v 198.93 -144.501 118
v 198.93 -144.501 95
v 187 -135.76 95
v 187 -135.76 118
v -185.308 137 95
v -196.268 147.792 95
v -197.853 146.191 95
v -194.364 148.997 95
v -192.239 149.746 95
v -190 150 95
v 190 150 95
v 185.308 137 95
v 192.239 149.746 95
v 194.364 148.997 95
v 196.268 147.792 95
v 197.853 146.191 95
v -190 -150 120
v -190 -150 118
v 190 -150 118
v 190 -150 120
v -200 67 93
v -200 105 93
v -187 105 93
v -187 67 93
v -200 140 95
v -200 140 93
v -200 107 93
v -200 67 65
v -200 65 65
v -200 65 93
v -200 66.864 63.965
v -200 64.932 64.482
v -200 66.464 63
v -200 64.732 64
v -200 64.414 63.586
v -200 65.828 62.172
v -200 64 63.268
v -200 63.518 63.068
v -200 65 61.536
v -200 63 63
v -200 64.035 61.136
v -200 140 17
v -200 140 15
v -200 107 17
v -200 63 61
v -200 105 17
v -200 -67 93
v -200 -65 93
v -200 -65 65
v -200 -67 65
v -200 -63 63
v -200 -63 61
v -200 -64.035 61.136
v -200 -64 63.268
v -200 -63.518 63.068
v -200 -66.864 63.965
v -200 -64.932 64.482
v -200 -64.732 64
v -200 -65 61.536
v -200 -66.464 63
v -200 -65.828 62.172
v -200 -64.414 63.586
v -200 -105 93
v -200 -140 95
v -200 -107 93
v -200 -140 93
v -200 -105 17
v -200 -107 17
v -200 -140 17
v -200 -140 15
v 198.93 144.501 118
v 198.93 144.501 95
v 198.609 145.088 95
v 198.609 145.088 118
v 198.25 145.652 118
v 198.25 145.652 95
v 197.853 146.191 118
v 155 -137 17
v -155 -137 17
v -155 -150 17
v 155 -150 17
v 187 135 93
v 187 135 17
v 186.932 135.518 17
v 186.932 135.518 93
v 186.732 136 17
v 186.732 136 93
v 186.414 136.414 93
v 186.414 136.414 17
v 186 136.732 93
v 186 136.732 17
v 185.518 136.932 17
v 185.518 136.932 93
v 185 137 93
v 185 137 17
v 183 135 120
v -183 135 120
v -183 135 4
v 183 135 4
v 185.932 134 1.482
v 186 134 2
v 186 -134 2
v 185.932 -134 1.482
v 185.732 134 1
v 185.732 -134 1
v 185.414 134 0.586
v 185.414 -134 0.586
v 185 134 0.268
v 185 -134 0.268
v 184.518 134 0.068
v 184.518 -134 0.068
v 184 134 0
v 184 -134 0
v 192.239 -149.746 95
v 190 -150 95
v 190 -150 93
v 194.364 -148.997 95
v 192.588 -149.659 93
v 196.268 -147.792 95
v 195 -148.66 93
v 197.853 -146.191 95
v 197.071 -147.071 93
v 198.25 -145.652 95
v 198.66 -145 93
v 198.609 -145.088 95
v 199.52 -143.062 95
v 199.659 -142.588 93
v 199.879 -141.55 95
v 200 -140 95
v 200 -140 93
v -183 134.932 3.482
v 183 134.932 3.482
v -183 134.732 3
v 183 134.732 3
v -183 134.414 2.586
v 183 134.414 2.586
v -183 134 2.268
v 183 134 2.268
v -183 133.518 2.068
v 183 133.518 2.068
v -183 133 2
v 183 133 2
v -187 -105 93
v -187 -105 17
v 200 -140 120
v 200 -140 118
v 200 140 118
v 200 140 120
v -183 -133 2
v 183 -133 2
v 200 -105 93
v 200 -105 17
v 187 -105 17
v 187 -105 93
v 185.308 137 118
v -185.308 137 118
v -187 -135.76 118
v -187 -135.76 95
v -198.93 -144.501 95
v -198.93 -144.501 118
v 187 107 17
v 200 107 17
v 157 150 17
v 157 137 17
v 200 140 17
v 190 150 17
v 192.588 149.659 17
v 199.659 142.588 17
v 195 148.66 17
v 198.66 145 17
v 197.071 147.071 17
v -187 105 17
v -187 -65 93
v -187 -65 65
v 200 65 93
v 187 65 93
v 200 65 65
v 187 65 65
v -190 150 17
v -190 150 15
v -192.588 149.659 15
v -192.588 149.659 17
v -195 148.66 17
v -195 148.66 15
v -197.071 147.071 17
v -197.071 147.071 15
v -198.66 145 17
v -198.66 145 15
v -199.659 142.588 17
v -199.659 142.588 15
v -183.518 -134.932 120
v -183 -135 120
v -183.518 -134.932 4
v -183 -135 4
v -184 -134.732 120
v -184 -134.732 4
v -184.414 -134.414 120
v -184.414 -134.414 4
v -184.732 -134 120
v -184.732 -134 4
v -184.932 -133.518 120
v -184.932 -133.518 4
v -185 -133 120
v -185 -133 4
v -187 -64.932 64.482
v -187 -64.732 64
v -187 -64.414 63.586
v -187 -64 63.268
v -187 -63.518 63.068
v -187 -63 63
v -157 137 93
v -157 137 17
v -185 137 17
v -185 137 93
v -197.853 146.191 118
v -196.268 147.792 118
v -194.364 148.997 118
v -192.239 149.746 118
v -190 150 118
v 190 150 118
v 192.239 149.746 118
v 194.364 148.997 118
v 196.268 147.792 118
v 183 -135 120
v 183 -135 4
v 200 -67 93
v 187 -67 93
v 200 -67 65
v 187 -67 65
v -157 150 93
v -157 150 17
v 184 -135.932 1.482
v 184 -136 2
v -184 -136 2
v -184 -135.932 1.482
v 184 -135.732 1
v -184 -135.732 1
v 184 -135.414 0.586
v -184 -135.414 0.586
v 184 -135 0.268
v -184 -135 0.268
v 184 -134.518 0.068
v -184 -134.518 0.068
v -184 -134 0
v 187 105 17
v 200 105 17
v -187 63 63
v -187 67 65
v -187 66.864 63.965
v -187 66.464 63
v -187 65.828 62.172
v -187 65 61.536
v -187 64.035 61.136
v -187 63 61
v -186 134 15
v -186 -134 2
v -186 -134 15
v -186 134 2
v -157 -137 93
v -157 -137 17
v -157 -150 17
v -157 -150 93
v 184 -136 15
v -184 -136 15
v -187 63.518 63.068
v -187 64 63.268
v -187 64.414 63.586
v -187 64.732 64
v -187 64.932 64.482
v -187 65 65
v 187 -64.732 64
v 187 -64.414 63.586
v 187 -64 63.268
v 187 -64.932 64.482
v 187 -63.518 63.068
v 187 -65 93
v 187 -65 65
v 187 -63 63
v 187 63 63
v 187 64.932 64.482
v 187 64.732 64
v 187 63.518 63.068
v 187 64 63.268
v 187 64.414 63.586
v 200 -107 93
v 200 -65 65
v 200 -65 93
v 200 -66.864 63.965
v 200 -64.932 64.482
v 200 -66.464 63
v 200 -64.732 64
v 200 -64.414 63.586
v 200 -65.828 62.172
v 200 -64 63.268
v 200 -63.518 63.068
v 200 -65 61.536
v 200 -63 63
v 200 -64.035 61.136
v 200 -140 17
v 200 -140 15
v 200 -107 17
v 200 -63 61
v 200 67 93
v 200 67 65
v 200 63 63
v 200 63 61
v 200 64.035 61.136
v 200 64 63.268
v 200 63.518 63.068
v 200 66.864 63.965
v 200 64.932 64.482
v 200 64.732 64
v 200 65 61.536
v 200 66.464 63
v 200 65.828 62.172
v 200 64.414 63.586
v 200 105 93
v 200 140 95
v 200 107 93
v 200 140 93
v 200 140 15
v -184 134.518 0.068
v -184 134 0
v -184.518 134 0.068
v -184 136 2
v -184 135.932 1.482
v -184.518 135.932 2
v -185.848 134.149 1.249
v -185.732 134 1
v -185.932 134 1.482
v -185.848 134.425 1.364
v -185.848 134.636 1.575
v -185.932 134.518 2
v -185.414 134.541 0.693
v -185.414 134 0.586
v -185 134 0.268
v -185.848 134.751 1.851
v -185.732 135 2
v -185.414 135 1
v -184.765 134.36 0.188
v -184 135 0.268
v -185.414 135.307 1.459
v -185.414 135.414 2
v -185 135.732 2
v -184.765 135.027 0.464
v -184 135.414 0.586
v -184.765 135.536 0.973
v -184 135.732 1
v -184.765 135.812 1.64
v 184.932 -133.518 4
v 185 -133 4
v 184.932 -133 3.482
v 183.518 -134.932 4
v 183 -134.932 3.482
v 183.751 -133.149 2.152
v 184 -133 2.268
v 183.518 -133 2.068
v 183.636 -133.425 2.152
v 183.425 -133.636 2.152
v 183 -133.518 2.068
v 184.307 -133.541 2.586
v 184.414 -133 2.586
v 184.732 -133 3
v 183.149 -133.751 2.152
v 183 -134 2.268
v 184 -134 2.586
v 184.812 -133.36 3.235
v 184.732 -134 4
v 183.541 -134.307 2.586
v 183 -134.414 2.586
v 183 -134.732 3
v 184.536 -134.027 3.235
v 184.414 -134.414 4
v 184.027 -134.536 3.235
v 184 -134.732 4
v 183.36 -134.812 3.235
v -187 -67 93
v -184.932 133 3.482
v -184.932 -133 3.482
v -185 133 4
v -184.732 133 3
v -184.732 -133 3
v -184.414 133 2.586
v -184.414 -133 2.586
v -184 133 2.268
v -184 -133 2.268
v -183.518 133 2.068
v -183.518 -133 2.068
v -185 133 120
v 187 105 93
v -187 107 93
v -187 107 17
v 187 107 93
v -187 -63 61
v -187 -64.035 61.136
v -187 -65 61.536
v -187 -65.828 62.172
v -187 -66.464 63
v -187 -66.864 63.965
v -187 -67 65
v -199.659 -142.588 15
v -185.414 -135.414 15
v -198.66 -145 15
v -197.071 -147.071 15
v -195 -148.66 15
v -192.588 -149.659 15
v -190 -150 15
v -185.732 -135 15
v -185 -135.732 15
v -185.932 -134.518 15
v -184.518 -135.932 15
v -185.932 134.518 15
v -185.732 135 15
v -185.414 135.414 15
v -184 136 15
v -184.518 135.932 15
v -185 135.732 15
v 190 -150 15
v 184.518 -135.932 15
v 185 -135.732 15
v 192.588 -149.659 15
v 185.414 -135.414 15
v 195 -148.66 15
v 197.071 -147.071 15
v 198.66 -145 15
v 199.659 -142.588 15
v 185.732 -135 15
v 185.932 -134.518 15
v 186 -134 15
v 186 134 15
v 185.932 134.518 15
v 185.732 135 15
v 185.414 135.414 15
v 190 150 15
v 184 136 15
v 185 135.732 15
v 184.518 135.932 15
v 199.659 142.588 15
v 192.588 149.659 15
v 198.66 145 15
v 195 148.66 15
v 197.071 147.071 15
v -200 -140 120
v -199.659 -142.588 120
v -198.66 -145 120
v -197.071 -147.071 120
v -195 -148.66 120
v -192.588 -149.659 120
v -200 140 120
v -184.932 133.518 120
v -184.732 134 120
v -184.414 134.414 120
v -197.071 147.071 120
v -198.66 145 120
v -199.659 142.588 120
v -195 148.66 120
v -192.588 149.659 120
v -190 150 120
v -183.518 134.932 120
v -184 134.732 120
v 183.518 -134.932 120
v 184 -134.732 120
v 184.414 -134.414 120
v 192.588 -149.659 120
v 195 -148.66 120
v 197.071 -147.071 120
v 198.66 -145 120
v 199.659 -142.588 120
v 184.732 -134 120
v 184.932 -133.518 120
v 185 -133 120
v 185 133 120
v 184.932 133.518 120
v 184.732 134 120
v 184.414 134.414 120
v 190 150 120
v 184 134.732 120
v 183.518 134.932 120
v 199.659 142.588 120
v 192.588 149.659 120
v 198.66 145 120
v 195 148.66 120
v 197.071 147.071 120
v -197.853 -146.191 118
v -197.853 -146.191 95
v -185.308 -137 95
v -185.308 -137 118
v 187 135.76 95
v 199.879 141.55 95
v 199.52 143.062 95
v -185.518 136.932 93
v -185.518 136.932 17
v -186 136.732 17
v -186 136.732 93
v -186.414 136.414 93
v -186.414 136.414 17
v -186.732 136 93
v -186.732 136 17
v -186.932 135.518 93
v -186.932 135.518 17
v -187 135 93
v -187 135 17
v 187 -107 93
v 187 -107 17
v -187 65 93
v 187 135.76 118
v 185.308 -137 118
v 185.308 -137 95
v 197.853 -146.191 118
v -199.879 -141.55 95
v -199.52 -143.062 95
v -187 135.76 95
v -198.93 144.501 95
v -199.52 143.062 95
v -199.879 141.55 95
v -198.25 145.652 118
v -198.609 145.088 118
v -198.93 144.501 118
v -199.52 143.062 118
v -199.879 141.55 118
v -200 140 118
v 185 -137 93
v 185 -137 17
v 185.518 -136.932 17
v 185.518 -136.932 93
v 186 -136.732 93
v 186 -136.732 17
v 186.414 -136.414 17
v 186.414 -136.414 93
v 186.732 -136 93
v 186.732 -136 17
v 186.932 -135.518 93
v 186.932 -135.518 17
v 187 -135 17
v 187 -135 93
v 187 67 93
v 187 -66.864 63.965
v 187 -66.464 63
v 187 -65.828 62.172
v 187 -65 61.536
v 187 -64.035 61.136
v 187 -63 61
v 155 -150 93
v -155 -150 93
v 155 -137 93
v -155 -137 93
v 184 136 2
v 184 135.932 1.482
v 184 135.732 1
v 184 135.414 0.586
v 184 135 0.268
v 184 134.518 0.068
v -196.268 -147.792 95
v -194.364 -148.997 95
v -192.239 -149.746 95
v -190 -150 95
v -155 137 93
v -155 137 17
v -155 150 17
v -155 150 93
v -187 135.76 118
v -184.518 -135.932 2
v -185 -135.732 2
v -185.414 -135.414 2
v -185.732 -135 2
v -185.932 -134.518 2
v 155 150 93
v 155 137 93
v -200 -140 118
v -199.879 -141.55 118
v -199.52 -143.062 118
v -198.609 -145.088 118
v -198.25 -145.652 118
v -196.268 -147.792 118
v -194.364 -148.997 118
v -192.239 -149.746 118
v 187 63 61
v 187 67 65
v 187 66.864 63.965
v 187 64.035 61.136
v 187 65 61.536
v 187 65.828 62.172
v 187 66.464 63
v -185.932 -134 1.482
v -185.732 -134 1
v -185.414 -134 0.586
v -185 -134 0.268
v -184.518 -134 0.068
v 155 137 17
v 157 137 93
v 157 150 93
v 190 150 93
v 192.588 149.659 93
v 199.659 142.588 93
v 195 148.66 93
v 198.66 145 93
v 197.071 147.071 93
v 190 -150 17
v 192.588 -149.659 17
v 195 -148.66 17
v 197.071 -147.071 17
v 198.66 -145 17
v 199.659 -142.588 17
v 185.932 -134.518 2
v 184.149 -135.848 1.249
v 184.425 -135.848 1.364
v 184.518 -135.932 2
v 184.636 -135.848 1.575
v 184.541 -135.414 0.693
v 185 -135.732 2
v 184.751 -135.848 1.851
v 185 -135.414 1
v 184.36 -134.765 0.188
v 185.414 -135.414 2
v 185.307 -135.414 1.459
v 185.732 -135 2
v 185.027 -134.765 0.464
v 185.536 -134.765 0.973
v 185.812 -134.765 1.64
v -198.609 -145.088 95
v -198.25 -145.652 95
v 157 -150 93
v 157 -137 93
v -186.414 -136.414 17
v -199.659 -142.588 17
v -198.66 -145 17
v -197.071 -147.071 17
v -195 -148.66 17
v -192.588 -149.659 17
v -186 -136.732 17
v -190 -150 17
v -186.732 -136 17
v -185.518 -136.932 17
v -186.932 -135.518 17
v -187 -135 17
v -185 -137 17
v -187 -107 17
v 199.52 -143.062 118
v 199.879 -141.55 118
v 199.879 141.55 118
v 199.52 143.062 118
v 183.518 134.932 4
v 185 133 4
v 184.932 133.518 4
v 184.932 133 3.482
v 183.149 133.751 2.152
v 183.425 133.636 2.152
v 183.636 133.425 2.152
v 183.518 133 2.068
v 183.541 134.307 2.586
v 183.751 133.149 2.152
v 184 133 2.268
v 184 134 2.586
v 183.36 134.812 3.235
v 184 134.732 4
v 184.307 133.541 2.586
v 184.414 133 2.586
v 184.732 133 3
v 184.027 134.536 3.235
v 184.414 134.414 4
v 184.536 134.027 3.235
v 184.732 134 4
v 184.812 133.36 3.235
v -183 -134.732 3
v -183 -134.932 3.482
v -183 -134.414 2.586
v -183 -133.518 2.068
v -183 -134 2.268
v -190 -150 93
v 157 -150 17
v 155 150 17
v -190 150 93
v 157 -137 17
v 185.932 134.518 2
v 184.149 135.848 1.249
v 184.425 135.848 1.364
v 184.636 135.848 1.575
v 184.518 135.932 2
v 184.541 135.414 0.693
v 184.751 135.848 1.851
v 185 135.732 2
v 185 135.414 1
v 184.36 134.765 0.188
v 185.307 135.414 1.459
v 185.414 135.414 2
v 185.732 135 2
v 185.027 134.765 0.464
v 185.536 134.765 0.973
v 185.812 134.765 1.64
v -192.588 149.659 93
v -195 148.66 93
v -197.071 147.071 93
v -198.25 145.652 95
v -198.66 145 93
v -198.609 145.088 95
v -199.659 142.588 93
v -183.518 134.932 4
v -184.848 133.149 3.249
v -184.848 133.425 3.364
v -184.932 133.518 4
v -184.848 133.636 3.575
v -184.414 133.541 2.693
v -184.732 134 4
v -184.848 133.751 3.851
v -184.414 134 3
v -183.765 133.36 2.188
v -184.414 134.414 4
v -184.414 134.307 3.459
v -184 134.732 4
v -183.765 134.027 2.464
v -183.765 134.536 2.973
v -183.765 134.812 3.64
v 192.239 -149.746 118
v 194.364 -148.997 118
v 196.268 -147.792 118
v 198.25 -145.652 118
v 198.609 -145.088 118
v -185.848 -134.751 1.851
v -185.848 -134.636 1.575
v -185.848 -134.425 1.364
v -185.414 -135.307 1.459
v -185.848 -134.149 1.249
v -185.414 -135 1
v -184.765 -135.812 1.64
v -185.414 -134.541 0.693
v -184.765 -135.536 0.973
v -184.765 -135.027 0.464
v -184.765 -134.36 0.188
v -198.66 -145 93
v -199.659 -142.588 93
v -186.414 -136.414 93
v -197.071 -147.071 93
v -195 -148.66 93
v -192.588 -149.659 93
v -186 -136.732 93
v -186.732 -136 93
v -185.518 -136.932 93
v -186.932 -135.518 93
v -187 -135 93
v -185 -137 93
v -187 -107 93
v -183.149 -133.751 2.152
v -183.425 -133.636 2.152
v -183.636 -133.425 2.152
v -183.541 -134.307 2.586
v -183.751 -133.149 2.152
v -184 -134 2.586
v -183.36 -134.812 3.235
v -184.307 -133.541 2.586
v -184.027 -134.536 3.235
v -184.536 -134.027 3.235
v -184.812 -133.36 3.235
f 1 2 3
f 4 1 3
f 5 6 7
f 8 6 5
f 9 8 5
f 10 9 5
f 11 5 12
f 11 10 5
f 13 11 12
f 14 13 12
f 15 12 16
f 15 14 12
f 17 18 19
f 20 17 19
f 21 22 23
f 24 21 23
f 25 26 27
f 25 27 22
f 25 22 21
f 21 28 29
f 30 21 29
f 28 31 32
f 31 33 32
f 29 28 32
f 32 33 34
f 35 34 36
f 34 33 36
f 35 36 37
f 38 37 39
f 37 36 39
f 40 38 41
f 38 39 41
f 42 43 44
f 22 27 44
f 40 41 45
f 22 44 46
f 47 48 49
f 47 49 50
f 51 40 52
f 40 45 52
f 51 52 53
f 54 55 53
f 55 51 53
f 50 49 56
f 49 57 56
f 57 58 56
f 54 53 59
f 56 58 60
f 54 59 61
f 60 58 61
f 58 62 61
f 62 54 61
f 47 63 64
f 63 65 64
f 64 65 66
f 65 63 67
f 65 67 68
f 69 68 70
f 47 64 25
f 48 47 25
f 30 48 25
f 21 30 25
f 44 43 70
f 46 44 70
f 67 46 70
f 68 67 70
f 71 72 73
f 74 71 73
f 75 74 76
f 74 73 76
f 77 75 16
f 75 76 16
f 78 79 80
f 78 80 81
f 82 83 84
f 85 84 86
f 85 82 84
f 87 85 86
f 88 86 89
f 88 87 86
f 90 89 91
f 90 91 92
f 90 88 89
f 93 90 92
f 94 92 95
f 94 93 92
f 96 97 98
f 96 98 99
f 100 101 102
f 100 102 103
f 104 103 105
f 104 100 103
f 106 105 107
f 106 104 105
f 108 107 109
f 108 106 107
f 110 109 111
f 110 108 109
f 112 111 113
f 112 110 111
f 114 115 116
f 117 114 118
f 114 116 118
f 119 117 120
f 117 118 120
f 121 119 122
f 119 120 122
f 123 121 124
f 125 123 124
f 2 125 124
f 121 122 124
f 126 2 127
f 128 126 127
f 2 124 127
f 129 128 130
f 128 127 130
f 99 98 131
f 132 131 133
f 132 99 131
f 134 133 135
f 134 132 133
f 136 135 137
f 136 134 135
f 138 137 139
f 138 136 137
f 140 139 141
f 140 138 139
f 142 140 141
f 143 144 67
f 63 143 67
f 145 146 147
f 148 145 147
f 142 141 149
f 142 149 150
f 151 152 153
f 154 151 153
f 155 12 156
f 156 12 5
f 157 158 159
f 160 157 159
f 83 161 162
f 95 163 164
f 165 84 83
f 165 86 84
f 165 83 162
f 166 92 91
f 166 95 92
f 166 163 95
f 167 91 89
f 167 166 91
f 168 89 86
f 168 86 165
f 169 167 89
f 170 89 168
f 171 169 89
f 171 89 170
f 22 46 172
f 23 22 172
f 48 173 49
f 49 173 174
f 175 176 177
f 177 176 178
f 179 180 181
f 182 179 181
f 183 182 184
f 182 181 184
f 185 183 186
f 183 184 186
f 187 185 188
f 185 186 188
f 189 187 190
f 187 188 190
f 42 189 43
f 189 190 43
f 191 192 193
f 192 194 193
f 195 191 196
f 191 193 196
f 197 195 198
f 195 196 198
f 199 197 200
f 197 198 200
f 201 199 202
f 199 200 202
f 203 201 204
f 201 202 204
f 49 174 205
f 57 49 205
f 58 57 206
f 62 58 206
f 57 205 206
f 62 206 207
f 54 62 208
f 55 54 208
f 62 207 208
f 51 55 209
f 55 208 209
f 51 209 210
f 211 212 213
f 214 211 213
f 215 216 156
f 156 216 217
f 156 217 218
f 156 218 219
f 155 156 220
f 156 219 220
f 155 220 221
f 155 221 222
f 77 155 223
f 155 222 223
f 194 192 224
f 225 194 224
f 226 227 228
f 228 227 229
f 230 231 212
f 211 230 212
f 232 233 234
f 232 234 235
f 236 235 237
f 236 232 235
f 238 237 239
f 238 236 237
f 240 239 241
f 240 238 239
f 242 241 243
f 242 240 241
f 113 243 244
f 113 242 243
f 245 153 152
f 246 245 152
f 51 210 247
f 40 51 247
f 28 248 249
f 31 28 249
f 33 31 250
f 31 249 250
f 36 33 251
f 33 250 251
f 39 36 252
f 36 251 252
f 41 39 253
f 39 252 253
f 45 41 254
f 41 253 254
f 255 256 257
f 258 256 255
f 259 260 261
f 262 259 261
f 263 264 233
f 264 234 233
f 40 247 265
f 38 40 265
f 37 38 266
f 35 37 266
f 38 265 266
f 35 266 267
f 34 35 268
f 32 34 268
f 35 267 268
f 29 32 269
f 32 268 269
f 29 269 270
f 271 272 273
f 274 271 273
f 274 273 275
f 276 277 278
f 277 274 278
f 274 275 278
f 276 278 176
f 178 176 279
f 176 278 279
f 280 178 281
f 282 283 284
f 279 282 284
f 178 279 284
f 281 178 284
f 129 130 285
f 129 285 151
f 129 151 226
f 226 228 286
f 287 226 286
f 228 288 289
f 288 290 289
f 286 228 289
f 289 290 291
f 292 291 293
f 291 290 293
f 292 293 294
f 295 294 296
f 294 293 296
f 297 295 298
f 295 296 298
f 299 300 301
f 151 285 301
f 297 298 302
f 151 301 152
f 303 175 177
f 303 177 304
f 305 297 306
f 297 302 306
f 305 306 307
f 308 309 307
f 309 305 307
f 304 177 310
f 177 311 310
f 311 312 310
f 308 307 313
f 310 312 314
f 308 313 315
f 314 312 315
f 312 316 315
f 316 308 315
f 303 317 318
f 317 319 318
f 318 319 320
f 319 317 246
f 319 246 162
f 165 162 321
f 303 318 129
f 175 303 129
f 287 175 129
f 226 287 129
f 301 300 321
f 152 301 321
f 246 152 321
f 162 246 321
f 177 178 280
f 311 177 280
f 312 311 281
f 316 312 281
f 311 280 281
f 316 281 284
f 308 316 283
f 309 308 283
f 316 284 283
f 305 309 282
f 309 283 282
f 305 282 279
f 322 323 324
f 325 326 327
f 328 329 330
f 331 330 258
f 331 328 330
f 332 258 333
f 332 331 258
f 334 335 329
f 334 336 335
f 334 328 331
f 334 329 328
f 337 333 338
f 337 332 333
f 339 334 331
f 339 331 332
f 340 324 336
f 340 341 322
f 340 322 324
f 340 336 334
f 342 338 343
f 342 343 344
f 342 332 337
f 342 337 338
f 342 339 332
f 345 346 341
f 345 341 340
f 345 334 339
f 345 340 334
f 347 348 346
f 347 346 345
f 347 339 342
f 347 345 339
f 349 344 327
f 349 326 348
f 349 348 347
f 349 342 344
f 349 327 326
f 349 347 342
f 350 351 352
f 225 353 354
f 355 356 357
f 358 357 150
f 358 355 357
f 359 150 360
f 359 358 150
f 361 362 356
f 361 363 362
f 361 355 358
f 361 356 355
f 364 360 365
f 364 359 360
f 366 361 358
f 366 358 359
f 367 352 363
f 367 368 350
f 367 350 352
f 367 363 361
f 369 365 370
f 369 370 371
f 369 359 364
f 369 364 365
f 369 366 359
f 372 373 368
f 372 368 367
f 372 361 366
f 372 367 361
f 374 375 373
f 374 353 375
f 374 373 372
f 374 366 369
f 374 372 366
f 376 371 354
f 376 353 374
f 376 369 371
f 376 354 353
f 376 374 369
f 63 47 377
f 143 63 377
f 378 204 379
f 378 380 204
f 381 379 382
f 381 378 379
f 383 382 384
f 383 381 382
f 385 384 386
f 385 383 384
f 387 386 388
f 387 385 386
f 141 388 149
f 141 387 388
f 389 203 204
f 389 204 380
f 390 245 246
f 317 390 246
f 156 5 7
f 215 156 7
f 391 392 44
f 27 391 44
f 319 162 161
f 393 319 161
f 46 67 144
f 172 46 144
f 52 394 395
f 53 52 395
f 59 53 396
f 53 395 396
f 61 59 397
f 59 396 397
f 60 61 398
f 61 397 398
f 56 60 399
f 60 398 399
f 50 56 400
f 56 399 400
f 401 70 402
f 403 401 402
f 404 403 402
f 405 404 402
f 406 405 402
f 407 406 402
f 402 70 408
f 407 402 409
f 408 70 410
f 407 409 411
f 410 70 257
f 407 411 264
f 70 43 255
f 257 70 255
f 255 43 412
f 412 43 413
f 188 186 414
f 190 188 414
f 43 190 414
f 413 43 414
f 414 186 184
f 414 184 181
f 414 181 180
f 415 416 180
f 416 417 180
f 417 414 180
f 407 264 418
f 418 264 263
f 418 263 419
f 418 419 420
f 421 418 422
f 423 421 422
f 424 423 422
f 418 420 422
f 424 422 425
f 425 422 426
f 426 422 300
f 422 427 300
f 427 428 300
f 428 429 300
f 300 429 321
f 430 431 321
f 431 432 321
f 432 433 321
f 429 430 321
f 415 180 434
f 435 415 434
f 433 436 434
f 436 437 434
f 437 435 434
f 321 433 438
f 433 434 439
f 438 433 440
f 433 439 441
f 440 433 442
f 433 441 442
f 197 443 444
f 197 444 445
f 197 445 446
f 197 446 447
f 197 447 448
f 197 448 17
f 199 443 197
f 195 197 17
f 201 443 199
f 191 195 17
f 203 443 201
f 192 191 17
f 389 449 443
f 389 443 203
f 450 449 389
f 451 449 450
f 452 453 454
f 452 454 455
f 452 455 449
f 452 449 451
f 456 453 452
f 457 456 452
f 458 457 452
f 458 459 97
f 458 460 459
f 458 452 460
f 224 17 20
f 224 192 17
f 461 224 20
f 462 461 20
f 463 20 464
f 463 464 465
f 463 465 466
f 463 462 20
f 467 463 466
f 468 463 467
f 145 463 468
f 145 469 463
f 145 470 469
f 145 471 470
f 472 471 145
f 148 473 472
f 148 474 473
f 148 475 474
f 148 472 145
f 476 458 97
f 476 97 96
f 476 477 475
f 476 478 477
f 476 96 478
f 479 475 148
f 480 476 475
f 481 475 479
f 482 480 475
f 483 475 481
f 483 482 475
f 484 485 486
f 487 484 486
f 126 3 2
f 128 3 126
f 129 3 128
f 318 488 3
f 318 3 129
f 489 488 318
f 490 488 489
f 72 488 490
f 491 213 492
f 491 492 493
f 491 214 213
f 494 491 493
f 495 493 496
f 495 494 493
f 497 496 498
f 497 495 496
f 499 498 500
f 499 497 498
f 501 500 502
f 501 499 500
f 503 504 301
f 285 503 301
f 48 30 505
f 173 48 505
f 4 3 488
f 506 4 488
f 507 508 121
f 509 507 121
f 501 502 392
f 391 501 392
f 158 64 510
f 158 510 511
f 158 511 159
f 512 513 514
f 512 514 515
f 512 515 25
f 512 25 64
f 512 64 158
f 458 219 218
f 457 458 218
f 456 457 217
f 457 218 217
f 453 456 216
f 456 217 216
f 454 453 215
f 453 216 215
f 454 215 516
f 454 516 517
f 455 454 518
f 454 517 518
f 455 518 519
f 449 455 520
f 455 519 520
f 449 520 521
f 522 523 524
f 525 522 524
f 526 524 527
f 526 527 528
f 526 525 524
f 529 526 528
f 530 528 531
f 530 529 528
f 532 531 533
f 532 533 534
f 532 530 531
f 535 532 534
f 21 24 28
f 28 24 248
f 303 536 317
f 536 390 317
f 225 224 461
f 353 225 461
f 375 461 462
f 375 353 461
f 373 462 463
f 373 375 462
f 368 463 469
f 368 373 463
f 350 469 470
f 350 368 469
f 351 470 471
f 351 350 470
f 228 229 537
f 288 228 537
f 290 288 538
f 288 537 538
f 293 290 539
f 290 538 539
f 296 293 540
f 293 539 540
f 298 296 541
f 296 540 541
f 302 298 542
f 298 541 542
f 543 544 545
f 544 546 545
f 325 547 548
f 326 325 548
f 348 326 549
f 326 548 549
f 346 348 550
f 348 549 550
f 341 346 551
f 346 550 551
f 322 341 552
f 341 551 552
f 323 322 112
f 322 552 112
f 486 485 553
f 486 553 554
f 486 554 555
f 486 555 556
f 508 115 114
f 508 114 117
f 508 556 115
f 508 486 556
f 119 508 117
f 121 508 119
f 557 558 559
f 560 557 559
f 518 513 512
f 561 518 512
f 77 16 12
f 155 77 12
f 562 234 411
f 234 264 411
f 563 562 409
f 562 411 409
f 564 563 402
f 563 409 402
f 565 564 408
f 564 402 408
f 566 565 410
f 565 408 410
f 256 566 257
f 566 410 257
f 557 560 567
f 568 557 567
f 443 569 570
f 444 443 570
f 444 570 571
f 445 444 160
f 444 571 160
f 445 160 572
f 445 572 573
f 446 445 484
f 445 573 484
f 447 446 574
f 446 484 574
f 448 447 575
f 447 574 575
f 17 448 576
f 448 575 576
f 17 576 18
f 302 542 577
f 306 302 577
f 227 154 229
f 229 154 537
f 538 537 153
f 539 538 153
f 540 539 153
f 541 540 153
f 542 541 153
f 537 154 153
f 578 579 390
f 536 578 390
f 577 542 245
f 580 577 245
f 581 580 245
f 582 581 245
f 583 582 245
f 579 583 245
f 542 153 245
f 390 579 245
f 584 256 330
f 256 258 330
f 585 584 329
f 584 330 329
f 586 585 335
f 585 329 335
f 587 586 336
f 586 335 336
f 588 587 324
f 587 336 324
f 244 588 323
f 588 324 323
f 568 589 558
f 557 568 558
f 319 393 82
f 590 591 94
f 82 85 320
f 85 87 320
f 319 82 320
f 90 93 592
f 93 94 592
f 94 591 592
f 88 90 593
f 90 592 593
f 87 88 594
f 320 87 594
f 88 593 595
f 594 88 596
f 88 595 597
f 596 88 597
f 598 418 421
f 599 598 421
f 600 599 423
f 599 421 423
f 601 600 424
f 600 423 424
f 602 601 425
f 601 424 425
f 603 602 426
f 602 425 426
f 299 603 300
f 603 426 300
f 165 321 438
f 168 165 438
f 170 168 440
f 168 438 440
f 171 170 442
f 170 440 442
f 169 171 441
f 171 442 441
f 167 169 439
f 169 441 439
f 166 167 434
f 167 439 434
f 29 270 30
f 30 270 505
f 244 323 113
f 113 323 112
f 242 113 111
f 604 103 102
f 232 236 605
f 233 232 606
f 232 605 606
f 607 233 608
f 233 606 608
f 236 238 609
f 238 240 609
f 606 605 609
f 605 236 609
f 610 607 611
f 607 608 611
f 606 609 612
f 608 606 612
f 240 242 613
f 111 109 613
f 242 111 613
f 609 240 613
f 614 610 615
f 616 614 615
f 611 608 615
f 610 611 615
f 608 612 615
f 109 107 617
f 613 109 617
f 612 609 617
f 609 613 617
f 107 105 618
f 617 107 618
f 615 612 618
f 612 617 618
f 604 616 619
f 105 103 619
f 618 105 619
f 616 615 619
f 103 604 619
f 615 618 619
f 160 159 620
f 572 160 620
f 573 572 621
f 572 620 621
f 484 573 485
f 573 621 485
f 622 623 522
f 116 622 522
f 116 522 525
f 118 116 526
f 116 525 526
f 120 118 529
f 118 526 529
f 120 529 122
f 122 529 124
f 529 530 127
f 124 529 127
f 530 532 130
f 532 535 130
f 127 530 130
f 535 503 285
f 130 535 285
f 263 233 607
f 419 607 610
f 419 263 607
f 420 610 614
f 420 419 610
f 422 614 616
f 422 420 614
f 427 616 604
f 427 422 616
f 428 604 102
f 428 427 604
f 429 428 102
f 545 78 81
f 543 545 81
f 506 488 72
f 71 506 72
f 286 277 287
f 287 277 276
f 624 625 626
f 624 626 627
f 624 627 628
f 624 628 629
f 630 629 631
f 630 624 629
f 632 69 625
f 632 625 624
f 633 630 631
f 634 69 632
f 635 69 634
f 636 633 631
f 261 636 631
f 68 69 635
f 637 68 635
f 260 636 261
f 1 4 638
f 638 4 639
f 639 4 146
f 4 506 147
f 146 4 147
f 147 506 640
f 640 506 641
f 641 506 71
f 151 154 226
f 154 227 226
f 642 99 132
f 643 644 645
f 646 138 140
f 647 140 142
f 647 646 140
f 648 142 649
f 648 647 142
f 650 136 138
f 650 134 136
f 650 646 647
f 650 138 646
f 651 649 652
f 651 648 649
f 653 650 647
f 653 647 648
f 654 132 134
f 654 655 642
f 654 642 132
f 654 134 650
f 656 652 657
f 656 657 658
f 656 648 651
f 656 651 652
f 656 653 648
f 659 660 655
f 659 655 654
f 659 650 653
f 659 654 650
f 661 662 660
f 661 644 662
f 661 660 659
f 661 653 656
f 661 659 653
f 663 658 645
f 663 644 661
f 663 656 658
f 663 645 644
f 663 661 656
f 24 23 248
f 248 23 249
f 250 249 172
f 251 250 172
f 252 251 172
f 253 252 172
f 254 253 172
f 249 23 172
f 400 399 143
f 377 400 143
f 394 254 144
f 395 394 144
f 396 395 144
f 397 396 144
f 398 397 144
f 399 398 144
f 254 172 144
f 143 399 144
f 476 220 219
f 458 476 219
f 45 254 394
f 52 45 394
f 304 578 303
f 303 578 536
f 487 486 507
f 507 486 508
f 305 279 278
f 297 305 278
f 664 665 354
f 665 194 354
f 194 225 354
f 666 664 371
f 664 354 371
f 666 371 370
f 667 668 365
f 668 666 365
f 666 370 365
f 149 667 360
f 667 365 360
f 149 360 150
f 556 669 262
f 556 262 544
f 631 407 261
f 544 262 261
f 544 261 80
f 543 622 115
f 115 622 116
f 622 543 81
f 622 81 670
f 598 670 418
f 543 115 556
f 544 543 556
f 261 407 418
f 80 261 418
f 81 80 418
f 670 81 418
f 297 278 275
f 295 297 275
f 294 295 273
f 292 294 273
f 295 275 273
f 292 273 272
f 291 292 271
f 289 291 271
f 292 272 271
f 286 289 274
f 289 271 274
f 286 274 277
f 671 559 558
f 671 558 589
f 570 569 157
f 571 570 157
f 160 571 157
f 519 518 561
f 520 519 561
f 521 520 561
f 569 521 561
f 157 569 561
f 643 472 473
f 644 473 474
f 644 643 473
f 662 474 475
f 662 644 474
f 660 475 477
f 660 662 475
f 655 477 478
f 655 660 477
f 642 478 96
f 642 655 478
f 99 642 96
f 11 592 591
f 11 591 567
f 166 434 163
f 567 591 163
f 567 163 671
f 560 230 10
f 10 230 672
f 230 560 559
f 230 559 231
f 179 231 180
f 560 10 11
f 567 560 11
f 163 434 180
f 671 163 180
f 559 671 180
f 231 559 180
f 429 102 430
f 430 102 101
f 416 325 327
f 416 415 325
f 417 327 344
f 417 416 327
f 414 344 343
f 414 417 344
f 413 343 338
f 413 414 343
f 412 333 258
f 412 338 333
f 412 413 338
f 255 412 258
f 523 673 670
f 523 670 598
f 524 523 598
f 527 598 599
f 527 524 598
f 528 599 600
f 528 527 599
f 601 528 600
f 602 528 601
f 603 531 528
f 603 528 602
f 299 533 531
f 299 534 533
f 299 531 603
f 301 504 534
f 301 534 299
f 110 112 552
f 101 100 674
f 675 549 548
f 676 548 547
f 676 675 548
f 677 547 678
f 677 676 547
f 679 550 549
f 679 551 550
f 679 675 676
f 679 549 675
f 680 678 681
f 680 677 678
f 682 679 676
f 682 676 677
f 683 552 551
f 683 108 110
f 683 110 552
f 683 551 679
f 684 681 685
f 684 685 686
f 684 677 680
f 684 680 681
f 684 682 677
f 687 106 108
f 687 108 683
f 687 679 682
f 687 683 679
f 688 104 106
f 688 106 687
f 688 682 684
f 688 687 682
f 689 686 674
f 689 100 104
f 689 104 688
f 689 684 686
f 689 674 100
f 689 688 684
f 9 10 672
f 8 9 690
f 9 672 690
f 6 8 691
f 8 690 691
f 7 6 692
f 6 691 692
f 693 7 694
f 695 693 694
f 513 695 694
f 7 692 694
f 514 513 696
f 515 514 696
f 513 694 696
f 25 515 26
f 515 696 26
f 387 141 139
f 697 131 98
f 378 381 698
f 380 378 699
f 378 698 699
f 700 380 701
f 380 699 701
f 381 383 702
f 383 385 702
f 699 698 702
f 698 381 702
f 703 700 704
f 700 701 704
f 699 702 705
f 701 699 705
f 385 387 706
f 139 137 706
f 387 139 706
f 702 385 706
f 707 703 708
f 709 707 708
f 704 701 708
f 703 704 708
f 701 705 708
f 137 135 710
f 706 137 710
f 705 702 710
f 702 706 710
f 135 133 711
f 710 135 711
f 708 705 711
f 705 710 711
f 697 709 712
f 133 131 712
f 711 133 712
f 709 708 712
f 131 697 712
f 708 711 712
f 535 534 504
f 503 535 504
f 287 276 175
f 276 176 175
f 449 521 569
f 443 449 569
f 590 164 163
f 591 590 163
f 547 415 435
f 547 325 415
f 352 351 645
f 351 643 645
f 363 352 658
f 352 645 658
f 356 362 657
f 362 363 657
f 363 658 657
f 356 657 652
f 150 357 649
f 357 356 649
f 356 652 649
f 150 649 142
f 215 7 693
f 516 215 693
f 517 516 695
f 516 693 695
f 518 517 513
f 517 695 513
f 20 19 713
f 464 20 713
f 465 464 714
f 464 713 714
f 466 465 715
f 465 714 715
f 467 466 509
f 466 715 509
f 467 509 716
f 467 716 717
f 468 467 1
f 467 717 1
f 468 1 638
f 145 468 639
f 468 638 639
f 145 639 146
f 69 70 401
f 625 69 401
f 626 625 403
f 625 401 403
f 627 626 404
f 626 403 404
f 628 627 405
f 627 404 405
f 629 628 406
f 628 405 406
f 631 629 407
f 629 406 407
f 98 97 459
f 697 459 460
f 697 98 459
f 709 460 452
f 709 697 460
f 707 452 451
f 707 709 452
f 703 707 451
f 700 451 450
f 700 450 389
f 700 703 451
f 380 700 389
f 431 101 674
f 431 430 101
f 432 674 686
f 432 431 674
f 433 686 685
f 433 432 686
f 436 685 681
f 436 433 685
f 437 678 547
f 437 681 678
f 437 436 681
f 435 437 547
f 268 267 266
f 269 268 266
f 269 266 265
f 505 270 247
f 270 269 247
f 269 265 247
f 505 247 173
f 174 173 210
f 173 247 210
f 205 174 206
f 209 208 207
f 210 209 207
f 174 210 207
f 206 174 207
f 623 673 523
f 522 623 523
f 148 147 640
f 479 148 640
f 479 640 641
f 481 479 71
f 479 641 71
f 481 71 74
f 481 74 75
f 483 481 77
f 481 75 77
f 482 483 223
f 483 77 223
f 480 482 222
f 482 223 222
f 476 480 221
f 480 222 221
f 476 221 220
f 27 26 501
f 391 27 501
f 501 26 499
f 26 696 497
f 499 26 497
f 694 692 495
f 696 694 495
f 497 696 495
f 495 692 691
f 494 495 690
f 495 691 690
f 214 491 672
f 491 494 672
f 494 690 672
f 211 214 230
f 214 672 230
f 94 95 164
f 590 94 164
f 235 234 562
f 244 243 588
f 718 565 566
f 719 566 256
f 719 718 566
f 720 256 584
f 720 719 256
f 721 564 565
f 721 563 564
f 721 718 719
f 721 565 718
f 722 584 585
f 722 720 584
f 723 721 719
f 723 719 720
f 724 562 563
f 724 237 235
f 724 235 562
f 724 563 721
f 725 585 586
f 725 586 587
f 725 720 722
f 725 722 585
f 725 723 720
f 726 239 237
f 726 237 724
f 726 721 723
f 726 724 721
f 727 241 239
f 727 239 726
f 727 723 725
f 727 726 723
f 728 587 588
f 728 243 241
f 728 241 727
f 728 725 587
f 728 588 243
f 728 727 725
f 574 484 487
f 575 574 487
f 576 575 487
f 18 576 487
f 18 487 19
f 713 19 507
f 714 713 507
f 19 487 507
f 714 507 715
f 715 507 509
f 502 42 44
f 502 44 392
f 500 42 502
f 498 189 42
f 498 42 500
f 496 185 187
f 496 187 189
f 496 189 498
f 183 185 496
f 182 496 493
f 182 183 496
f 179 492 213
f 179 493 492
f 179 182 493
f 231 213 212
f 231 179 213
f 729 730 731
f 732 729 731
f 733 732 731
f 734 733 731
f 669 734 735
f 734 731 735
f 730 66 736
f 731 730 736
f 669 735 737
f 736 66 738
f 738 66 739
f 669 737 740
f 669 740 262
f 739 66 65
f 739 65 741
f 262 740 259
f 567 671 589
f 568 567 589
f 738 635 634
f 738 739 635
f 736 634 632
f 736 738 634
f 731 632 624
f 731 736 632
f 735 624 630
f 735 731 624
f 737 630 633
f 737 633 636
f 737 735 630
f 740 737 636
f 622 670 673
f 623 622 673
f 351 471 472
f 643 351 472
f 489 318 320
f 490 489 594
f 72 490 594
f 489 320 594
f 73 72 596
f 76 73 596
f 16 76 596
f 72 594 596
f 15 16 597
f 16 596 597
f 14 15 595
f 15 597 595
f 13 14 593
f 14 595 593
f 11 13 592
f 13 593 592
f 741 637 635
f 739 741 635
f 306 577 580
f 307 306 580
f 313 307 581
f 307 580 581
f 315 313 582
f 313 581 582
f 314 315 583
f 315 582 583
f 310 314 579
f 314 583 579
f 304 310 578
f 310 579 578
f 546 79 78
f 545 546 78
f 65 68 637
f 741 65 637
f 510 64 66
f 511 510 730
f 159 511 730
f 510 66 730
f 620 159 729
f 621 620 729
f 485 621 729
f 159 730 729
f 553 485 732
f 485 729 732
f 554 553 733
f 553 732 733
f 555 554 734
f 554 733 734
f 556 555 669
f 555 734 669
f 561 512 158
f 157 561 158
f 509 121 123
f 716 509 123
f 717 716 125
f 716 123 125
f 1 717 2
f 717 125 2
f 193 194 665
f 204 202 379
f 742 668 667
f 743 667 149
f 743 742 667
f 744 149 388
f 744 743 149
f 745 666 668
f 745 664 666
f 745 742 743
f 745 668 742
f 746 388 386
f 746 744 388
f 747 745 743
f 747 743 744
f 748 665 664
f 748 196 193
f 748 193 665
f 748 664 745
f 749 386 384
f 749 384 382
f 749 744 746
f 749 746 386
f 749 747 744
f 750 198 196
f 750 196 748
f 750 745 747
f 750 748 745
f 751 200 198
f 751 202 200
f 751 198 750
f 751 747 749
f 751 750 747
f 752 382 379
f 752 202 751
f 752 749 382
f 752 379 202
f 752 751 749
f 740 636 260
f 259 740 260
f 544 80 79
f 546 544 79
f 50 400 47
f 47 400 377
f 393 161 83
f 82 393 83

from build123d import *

# Parameters (mm, degrees)
F0_W      = 372
F0_H      = 272
F1_DEPTH  = 15
F2_W      = 372
F2_H      = 272
F3_DEPTH  = 2
F5_DEPTH  = 76
F7_DEPTH  = 2
F9_DEPTH  = 23
F11_DEPTH = 2
F12_W     = 370
F12_H     = 270
F13_DEPTH = 118
F15_DEPTH = 13
F17_DEPTH = 13
F18_R     = 2


with BuildPart() as f1:
    # F0 (on Top) → F1 (new body)
    with BuildSketch(Plane.XY):
        Rectangle(F0_W, F0_H)
    extrude(amount=F1_DEPTH)

    # F2 (on face) → F3 (join)
    with BuildSketch(Plane.XY.offset(15)):
        with BuildLine():
            Line((-190, -150), (190, -150))
            ThreePointArc((190, -150), (197.0710678119, -147.0710678119), (200, -140))
            Line((200, -140), (200, 140))
            ThreePointArc((200, 140), (197.0710678119, 147.0710678119), (190, 150))
            Line((190, 150), (-190, 150))
            ThreePointArc((-190, 150), (-197.0710678119, 147.0710678119), (-200, 140))
            Line((-200, 140), (-200, -140))
            ThreePointArc((-200, -140), (-197.0710678119, -147.0710678119), (-190, -150))
        make_face()
        Rectangle(F2_W, F2_H, mode=Mode.SUBTRACT)
        Rectangle(F2_W, F2_H)
    extrude(amount=F3_DEPTH)

    # F4 (on face) → F5 (join)
    with BuildSketch(Plane.XY.offset(17)):
        Polygon((157, -137), (187, -137), (187, -107), (200, -107), (200, -105), (187, -105), (187, 105), (200, 105), (200, 107), (187, 107), (187, 137), (157, 137), (157, 150), (155, 150), (155, 137), (-155, 137), (-155, 150), (-157, 150), (-157, 137), (-187, 137), (-187, 107), (-200, 107), (-200, 105), (-187, 105), (-187, -105), (-200, -105), (-200, -107), (-187, -107), (-187, -137), (-157, -137), (-157, -150), (-155, -150), (-155, -137), (155, -137), (155, -150), (157, -150), align=None)
    extrude(amount=F5_DEPTH)

    # F6 (on face) → F7 (join)
    with BuildSketch(Plane.XY.offset(93)):
        with BuildLine():
            Line((190, 150), (-190, 150))
            ThreePointArc((-190, 150), (-197.0710678119, 147.0710678119), (-200, 140))
            Line((-200, 140), (-200, -140))
            ThreePointArc((-200, -140), (-197.0710678119, -147.0710678119), (-190, -150))
            Line((-190, -150), (190, -150))
            ThreePointArc((190, -150), (197.0710678119, -147.0710678119), (200, -140))
            Line((200, -140), (200, 140))
            ThreePointArc((200, 140), (197.0710678119, 147.0710678119), (190, 150))
        make_face()
    extrude(amount=F7_DEPTH)

    # F8 (on face) → F9 (join)
    with BuildSketch(Plane.XY.offset(95)):
        with BuildLine():
            Line((-185.3079227659, -137), (185.3079227659, -137))
            Line((185.3079227659, -137), (197.8531877713, -146.1909160735))
            ThreePointArc((197.8531877713, -146.1909160735), (198.4340605379, -145.3727667773), (198.9300207482, -144.5005254622))
            Line((198.9300207482, -144.5005254622), (187, -135.7603498338))
            Line((187, -135.7603498338), (187, 135.7603498338))
            Line((187, 135.7603498338), (198.9300207482, 144.5005254622))
            ThreePointArc((198.9300207482, 144.5005254622), (198.4340605379, 145.3727667773), (197.8531877713, 146.1909160735))
            Line((197.8531877713, 146.1909160735), (185.3079227659, 137))
            Line((185.3079227659, 137), (-185.3079227659, 137))
            Line((-185.3079227659, 137), (-197.8531877713, 146.1909160735))
            ThreePointArc((-197.8531877713, 146.1909160735), (-198.4340605379, 145.3727667773), (-198.9300207482, 144.5005254622))
            Line((-198.9300207482, 144.5005254622), (-187, 135.7603498338))
            Line((-187, 135.7603498338), (-187, -135.7603498338))
            Line((-187, -135.7603498338), (-198.9300207482, -144.5005254622))
            ThreePointArc((-198.9300207482, -144.5005254622), (-198.4340605379, -145.3727667773), (-197.8531877713, -146.1909160735))
            Line((-197.8531877713, -146.1909160735), (-185.3079227659, -137))
        make_face()
    extrude(amount=F9_DEPTH)

    # F10 (on face) → F11 (join)
    with BuildSketch(Plane.XY.offset(118)):
        with BuildLine():
            Line((-190, -150), (190, -150))
            ThreePointArc((190, -150), (197.0710678119, -147.0710678119), (200, -140))
            Line((200, -140), (200, 140))
            ThreePointArc((200, 140), (197.0710678119, 147.0710678119), (190, 150))
            Line((190, 150), (-190, 150))
            ThreePointArc((-190, 150), (-197.0710678119, 147.0710678119), (-200, 140))
            Line((-200, 140), (-200, -140))
            ThreePointArc((-200, -140), (-197.0710678119, -147.0710678119), (-190, -150))
        make_face()
    extrude(amount=F11_DEPTH)

    # F12 (on face) → F13 (cut)
    with BuildSketch(Plane.XY.offset(120)):
        Rectangle(F12_W, F12_H)
    extrude(amount=-F13_DEPTH, mode=Mode.SUBTRACT)

    # F14 (on face) → F15 (join, through all)
    with BuildSketch(Plane(origin=(-187, 0, 0), x_dir=(0, -1, 0), z_dir=(-1, 0, 0))):
        with BuildLine():
            Line((-63, 61), (63, 61))
            ThreePointArc((63, 61), (65.8284271247, 62.1715728753), (67, 65))
            Line((67, 65), (67, 93))
            Line((67, 93), (65, 93))
            Line((65, 93), (65, 65))
            ThreePointArc((65, 65), (64.4142135624, 63.5857864376), (63, 63))
            Line((63, 63), (-63, 63))
            ThreePointArc((-63, 63), (-64.4142135624, 63.5857864376), (-65, 65))
            Line((-65, 65), (-65, 93))
            Line((-65, 93), (-67, 93))
            Line((-67, 93), (-67, 65))
            ThreePointArc((-67, 65), (-65.8284271247, 62.1715728753), (-63, 61))
        make_face()
    extrude(amount=F15_DEPTH)

    # F16 (on face) → F17 (join, through all)
    with BuildSketch(Plane.YZ.offset(187)):
        with BuildLine():
            ThreePointArc((63, 61), (65.8284271247, 62.1715728753), (67, 65))
            Line((67, 65), (67, 93))
            Line((67, 93), (65, 93))
            Line((65, 93), (65, 65))
            ThreePointArc((65, 65), (64.4142135624, 63.5857864376), (63, 63))
            Line((63, 63), (-63, 63))
            ThreePointArc((-63, 63), (-64.4142135624, 63.5857864376), (-65, 65))
            Line((-65, 65), (-65, 93))
            Line((-65, 93), (-67, 93))
            Line((-67, 93), (-67, 65))
            ThreePointArc((-67, 65), (-65.8284271247, 62.1715728753), (-63, 61))
            Line((-63, 61), (63, 61))
        make_face()
    extrude(amount=F17_DEPTH)

    # F18
    f18_edges = [f1.edges().sort_by_distance(p)[0] for p in [
        (-185, -135, 61),
        (185, -135, 61),
        (185, 135, 61),
        (0, 135, 2),
        (185, 0, 2),
        (0, -135, 2),
        (-185, 0, 2),
        (-185, 135, 61),
        (187, -137, 55),
        (187, 137, 55),
        (-187, 137, 55),
        (-187, -137, 55),
        (186, 0, 0),
        (0, 136, 0),
        (186, 136, 7.5),
        (0, -136, 0),
        (186, -136, 7.5),
        (-186, -136, 7.5),
        (-186, 0, 0),
        (-186, 136, 7.5),
    ]]
    fillet(f18_edges, radius=F18_R)


solid = f1.part
